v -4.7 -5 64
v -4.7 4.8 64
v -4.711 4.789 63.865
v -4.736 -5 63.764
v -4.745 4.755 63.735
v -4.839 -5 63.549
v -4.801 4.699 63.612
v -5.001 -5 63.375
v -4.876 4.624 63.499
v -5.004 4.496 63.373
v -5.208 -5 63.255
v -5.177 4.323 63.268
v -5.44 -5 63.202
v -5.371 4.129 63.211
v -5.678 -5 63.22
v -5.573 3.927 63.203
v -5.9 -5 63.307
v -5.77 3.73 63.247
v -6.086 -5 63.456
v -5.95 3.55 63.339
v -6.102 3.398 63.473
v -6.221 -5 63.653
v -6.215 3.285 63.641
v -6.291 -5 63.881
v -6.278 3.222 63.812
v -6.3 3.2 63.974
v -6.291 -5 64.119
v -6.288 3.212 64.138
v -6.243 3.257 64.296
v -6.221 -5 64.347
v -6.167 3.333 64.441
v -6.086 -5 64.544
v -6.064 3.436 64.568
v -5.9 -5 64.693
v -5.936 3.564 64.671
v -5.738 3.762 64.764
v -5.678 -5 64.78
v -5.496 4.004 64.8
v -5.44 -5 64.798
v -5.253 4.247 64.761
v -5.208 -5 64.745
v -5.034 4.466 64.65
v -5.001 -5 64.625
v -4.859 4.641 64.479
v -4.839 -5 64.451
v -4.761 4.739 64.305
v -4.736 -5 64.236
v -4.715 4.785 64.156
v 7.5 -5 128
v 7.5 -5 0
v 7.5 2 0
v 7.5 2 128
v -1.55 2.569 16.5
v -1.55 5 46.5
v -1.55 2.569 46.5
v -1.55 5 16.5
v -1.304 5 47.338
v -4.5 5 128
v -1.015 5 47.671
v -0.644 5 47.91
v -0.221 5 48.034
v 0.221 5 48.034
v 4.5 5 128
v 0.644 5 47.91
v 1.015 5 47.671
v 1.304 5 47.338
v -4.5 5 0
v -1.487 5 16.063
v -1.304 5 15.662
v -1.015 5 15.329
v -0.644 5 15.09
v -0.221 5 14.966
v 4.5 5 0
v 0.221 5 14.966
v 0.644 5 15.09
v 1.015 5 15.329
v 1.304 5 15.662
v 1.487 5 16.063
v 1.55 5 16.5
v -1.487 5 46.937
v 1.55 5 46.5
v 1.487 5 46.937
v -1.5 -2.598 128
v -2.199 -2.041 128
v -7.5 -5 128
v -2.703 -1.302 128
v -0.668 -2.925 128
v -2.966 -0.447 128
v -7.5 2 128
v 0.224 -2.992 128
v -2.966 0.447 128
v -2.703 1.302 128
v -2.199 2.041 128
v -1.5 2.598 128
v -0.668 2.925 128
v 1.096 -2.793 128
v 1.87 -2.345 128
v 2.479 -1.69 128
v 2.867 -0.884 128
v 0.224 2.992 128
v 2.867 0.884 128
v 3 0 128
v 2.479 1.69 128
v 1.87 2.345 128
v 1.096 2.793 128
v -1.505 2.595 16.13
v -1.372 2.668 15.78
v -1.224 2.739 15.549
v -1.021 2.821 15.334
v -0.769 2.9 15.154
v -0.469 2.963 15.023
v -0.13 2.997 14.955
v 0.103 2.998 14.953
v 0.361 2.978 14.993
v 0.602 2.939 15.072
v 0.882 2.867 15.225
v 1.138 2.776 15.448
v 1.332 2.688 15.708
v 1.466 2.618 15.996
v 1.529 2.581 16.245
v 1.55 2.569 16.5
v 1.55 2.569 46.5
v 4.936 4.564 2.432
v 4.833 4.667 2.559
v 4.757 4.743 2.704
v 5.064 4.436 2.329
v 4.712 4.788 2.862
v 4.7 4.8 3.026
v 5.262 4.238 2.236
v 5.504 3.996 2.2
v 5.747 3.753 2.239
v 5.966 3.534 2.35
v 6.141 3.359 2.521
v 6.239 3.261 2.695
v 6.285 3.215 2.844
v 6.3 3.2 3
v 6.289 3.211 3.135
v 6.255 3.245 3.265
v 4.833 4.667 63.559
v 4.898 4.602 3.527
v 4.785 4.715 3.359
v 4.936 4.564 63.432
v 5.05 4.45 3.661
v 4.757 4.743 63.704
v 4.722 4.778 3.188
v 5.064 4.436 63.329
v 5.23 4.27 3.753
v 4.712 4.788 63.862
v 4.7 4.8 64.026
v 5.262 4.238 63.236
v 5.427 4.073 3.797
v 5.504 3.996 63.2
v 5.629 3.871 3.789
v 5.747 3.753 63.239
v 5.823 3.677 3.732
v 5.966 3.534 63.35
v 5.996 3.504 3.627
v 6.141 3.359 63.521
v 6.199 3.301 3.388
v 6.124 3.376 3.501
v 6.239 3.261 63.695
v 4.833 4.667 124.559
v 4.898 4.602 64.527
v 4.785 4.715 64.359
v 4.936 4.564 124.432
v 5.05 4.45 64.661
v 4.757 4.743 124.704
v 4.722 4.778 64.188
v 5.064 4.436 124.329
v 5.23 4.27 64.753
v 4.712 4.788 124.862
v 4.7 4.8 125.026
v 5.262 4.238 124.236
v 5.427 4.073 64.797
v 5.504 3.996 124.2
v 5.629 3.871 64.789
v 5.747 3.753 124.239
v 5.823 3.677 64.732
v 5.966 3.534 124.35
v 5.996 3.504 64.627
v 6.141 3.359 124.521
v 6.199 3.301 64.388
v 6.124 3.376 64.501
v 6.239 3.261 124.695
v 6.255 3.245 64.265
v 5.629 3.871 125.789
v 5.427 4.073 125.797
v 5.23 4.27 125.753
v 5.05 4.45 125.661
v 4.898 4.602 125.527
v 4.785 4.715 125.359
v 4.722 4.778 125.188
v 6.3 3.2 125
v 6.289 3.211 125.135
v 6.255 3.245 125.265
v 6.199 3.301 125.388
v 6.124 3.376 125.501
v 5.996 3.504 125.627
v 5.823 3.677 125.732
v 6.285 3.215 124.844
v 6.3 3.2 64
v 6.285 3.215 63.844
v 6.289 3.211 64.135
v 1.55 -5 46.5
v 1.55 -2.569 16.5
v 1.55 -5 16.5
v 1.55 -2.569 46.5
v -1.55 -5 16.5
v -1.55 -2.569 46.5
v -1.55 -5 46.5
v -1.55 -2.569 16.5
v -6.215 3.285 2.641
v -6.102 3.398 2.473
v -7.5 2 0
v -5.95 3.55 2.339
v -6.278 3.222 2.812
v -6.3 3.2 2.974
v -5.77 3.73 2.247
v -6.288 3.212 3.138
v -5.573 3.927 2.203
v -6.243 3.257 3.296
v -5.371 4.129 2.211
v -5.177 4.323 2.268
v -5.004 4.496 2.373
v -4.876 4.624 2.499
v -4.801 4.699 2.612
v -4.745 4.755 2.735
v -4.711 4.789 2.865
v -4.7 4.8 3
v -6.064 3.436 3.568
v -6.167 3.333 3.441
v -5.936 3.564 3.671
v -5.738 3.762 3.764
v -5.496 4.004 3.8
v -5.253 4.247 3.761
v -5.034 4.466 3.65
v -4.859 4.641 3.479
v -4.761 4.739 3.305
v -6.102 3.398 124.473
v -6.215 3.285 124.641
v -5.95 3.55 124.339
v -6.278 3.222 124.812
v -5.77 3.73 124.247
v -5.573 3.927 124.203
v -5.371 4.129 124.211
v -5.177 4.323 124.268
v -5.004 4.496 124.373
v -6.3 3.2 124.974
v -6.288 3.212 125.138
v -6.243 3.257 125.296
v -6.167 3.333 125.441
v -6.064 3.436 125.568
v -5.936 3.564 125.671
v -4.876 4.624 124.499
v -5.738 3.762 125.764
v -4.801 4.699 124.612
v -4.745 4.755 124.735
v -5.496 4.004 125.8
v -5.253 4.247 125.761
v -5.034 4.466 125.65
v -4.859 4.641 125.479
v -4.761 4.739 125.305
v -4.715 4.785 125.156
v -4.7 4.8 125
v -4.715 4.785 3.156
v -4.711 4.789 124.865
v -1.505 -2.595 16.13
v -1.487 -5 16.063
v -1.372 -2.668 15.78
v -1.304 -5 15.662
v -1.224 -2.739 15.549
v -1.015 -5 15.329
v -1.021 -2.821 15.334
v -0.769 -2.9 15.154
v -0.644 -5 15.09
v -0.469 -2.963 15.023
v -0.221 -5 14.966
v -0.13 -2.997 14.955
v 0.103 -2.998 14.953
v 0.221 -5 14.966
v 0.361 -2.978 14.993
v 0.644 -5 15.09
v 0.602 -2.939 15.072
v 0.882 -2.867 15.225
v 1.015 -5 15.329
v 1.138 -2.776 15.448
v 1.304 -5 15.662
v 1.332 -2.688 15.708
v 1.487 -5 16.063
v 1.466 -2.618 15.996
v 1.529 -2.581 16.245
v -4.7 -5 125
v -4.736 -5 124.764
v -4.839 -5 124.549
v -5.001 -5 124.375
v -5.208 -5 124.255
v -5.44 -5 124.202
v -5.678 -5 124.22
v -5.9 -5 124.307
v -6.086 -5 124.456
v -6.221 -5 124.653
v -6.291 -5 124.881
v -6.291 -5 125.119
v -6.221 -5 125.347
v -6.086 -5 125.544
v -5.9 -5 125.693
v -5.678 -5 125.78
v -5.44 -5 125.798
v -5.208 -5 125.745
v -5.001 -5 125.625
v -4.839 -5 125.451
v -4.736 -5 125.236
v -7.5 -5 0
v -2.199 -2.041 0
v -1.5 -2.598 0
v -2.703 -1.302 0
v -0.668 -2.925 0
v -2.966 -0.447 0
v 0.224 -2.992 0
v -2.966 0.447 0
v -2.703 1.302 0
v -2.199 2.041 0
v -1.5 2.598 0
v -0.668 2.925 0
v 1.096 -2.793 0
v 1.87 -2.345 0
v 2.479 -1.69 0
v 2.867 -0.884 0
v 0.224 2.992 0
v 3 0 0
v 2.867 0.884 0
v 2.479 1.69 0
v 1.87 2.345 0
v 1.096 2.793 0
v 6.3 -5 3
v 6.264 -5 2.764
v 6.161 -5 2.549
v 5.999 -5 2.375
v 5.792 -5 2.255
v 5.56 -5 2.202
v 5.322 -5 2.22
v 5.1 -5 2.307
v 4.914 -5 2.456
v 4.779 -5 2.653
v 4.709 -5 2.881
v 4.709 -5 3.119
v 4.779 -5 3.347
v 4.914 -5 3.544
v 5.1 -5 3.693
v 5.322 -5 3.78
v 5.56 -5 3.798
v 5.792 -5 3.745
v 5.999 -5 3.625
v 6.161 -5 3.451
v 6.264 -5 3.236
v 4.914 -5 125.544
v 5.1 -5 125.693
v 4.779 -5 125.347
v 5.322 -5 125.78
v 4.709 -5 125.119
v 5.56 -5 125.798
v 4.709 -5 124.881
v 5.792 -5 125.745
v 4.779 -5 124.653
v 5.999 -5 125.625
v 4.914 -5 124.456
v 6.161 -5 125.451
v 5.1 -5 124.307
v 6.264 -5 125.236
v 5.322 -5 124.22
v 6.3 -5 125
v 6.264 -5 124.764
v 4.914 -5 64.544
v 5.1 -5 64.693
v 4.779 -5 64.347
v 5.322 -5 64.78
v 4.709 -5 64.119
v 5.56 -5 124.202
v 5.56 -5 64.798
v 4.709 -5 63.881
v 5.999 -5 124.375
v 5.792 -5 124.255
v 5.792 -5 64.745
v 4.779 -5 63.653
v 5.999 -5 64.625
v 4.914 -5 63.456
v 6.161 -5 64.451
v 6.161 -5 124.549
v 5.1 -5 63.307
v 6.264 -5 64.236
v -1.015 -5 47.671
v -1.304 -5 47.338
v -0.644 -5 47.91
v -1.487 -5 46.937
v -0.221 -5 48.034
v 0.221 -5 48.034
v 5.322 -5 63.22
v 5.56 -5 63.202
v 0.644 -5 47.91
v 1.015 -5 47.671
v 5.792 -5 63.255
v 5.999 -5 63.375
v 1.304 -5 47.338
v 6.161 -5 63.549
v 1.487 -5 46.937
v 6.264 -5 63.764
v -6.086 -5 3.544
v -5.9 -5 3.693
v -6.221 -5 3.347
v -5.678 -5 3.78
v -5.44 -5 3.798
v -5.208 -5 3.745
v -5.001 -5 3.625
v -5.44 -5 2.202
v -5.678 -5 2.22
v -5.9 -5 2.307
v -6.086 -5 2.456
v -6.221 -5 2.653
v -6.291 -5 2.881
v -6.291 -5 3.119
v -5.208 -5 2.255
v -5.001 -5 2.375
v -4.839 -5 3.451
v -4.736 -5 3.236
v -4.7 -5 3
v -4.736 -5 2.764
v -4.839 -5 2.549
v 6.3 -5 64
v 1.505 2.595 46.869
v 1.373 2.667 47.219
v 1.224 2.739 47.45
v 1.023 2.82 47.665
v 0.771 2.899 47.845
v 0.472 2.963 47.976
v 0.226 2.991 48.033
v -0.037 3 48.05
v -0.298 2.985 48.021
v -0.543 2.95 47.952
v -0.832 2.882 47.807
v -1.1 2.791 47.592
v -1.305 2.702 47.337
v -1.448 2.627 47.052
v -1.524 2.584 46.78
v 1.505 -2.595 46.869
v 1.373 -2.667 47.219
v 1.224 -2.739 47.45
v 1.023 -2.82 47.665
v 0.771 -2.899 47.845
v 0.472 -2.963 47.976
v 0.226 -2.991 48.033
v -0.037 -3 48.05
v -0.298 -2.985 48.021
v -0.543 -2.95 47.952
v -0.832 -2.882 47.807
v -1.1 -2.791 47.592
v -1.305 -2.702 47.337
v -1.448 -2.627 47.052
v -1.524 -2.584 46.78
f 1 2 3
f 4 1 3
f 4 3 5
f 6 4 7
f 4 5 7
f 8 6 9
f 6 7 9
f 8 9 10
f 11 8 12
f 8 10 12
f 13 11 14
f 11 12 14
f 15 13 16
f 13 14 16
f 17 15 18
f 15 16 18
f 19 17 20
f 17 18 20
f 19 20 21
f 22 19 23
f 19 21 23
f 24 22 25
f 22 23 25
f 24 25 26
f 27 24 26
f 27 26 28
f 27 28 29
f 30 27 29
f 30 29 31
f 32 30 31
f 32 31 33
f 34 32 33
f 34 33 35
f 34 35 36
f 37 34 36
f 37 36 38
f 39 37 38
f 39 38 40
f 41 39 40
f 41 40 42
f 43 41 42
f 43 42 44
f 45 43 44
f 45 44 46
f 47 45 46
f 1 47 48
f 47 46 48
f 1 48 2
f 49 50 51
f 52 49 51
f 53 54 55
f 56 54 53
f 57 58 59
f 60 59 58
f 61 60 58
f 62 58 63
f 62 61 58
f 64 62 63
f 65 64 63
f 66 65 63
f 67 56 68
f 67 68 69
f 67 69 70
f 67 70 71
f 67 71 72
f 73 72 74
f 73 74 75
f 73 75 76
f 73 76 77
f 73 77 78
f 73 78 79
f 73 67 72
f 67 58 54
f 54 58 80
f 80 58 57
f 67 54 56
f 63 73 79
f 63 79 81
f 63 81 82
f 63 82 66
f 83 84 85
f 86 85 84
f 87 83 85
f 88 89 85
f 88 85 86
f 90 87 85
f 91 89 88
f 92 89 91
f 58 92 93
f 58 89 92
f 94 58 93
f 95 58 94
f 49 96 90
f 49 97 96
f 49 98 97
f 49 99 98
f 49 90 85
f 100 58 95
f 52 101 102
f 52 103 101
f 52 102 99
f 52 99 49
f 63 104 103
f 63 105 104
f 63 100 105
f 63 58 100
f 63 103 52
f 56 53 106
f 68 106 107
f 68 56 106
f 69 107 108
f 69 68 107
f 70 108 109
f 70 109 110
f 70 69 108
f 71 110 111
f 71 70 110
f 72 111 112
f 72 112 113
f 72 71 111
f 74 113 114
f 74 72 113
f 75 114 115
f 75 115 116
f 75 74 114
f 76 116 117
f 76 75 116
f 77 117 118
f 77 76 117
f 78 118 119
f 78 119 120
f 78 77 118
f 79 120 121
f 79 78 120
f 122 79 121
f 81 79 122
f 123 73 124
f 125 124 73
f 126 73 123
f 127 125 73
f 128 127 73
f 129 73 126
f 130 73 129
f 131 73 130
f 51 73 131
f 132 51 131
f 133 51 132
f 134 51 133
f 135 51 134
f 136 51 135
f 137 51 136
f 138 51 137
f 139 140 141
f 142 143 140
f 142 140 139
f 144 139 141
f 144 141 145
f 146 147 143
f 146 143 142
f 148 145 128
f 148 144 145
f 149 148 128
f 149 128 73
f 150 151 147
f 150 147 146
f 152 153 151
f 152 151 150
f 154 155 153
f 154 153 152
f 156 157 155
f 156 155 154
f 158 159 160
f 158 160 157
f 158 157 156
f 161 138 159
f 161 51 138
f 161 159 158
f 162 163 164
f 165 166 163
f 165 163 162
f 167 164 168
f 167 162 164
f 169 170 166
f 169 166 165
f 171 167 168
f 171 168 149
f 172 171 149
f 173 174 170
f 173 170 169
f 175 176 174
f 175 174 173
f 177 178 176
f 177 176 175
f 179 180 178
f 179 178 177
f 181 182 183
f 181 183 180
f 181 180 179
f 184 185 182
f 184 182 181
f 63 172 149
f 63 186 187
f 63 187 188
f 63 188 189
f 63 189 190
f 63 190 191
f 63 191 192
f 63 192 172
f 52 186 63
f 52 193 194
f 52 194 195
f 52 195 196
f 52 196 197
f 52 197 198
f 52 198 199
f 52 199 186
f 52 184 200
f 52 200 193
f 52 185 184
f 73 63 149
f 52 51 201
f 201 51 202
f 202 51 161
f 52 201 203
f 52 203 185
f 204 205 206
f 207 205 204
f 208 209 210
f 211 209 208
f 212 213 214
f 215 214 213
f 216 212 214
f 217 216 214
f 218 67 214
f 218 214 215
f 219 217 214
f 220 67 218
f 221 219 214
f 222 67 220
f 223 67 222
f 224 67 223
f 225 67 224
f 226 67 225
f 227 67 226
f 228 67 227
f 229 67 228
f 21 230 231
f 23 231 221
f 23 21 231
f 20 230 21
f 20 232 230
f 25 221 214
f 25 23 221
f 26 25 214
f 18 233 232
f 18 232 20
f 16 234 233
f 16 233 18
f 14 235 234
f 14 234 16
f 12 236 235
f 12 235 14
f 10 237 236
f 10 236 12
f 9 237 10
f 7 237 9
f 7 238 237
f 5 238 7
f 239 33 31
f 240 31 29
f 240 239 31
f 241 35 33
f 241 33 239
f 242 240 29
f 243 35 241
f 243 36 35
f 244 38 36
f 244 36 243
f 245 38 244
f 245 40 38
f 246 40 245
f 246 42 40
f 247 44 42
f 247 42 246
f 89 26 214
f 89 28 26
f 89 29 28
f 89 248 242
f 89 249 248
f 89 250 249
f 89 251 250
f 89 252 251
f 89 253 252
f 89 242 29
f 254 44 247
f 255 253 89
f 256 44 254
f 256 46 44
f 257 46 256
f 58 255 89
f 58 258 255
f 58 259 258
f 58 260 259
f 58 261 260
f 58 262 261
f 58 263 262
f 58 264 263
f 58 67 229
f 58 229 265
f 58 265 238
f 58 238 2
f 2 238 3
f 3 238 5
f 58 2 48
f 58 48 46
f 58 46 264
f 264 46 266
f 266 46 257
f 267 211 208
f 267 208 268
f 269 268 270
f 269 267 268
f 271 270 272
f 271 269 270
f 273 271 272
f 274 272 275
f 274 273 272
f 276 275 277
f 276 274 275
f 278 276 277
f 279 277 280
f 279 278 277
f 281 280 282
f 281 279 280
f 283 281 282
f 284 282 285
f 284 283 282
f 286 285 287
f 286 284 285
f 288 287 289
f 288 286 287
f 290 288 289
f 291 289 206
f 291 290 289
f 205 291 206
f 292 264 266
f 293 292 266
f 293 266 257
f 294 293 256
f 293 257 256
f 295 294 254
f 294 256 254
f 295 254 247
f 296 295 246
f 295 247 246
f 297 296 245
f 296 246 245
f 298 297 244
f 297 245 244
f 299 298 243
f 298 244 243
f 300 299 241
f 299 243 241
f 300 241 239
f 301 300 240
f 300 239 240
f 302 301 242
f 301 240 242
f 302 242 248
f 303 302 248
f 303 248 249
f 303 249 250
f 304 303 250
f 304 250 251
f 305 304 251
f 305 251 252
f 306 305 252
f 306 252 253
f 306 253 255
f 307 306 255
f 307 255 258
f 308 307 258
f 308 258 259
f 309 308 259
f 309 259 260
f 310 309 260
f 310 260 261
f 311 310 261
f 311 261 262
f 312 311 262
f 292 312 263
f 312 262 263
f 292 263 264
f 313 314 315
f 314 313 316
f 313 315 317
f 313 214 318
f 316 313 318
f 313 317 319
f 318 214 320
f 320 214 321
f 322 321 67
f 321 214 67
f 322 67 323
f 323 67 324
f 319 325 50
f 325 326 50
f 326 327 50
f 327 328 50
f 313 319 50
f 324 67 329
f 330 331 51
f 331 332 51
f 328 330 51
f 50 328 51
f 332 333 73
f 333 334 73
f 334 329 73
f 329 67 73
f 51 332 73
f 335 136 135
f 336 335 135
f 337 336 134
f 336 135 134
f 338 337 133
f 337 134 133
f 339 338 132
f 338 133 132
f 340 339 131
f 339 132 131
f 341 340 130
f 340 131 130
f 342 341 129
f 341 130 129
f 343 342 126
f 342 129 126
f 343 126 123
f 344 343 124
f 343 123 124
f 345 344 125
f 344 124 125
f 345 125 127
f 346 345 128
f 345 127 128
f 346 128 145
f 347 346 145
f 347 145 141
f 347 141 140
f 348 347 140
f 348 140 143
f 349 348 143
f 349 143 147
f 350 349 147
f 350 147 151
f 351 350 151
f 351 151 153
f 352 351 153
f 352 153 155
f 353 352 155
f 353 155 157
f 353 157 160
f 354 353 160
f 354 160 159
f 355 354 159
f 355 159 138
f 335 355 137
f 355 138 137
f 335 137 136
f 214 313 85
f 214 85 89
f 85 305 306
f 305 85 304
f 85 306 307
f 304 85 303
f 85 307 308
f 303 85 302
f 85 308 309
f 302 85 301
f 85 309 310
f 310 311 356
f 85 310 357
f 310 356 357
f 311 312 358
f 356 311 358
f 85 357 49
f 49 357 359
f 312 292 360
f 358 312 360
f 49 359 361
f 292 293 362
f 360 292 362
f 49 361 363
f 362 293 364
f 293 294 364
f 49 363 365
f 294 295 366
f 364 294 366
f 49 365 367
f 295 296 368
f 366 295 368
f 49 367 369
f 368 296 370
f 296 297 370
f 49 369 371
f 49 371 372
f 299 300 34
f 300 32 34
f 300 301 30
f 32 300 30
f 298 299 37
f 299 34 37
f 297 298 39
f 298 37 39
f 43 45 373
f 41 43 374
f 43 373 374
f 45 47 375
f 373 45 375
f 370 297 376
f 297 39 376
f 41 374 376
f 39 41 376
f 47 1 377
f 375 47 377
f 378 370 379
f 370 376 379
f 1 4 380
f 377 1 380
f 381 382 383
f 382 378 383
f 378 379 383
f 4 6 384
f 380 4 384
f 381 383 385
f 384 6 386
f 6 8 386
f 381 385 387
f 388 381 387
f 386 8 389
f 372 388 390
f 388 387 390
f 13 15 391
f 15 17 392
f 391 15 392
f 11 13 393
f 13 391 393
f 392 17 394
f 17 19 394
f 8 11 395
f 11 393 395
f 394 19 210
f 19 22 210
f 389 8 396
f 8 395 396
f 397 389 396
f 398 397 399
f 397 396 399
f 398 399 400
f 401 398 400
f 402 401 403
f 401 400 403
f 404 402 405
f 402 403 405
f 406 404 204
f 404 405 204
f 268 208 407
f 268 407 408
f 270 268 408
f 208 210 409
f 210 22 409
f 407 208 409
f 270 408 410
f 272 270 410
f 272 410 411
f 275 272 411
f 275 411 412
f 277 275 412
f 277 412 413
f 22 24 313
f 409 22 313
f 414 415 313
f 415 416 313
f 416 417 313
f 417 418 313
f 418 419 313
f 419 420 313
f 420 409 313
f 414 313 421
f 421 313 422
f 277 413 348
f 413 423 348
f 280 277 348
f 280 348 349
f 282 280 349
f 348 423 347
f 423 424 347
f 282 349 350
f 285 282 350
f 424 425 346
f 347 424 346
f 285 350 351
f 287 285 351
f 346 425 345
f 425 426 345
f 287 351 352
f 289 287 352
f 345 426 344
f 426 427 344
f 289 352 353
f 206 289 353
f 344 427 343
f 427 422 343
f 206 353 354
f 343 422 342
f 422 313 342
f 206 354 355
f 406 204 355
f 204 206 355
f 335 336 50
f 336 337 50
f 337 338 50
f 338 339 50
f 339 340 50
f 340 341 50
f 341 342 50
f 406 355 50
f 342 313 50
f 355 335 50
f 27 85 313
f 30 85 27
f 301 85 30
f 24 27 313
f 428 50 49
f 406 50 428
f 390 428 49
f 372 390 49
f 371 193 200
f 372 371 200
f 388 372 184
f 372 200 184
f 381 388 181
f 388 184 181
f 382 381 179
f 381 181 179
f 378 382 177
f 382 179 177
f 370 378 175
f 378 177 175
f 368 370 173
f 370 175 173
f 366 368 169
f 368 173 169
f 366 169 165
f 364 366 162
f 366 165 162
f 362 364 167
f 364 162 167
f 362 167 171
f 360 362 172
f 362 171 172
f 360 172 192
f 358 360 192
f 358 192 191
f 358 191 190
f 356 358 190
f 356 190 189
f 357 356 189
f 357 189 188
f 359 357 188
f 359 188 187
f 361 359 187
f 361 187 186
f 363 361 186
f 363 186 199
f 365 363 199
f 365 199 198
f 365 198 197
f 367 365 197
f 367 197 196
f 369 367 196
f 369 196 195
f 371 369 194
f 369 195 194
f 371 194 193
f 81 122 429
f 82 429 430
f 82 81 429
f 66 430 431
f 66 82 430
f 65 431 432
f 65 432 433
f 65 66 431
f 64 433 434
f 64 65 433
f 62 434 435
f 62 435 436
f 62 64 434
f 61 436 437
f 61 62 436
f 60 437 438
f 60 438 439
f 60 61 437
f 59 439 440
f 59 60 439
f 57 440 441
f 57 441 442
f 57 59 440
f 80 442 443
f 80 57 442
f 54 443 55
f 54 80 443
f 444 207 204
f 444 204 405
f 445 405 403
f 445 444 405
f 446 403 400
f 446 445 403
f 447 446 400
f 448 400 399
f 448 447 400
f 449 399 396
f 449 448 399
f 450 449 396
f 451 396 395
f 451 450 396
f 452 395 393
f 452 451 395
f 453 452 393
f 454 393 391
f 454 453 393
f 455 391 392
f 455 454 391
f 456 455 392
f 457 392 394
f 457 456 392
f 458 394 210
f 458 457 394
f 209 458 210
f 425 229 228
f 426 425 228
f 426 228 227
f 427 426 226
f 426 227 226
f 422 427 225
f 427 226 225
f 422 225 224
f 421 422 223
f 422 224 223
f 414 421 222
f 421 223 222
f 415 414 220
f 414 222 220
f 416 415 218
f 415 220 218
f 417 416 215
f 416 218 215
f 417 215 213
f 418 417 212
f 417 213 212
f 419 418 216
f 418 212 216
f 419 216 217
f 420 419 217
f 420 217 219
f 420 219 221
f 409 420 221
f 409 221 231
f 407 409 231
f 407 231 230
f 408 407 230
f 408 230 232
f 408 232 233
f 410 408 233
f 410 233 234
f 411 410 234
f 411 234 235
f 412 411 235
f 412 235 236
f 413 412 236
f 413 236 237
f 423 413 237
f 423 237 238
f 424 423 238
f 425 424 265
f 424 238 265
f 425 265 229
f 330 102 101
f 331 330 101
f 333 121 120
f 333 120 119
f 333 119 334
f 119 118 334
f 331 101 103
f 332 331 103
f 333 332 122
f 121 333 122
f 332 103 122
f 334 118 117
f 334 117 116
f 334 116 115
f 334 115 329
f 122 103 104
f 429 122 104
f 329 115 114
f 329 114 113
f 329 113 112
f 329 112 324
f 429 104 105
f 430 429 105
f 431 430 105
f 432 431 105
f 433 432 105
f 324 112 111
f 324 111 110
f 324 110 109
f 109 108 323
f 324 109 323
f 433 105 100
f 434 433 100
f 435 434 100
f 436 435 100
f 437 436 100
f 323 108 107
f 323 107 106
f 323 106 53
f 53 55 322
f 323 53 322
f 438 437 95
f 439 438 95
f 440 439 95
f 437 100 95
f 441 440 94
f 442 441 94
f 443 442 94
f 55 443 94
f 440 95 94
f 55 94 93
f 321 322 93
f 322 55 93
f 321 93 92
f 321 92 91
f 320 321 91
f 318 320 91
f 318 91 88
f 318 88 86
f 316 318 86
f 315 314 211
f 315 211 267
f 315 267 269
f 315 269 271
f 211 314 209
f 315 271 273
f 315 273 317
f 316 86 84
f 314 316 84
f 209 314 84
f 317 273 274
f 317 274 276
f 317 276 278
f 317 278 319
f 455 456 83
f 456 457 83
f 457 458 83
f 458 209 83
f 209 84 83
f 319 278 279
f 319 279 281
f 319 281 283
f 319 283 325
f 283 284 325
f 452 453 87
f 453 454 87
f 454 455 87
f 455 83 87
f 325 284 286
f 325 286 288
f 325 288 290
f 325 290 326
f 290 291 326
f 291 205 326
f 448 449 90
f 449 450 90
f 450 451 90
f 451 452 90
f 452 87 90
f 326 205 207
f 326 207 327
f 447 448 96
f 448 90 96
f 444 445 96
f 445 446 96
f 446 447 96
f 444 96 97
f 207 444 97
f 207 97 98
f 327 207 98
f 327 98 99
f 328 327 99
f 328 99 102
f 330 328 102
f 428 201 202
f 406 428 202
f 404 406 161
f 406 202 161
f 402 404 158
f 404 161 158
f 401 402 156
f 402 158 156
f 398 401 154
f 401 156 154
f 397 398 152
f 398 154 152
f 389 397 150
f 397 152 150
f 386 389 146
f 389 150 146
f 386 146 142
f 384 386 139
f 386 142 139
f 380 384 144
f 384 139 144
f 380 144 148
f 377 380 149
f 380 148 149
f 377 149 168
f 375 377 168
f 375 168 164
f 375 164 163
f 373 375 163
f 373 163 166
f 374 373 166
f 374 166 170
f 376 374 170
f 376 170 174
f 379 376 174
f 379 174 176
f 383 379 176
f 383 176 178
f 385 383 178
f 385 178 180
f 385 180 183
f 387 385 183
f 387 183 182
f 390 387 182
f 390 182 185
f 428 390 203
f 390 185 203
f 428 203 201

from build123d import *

# Parameters (mm, degrees)
ESQUISSE1_W                               = 15
ESQUISSE1_H                               = 10
BOSS_EXTRU_1_DEPTH                        = 128
ESQUISSE2_R                               = 3
ENL_V_MAT_EXTRU_1_DEPTH                   = 129.316990301
ENL_V_MAT_EXTRU_2_DEPTH                   = 129.608903269
CHANFREIN1_SIZE                           = 3
TROU_POUR_TARAUDAGE_POUR_TROU_TARAUD_M2_D = 1.6
R_P_TITION_LIN_AIRE1_COUNT                = 3
R_P_TITION_LIN_AIRE1_PITCH                = 61
R_P_TITION_LIN_AIRE1_COUNT_DIR2           = 2
R_P_TITION_LIN_AIRE1_PITCH_DIR2           = 11


with BuildPart() as part:
    # Esquisse1 → Boss.-Extru.1 (new body)
    with BuildSketch(Plane.XY):
        Rectangle(ESQUISSE1_W, ESQUISSE1_H)
    extrude(amount=BOSS_EXTRU_1_DEPTH)

    # Esquisse2 → Enlèv. mat.-Extru.1 (cut, through all)
    with BuildSketch(Plane.XY.offset(128)):
        Circle(ESQUISSE2_R)
    extrude(amount=-ENL_V_MAT_EXTRU_1_DEPTH, mode=Mode.SUBTRACT)

    # Esquisse3 → Enlèv. mat.-Extru.2 (cut, through all)
    with BuildSketch(Plane(origin=(0, 5, 0), x_dir=(1, 0, 0), z_dir=(0, 1, 0))):
        with BuildLine():
            Line((1.55, -16.5), (1.55, -46.5))
            ThreePointArc((1.55, -46.5), (0, -48.05), (-1.55, -46.5))
            Line((-1.55, -46.5), (-1.55, -16.5))
            ThreePointArc((-1.55, -16.5), (0, -14.95), (1.55, -16.5))
        make_face()
    extrude(amount=-ENL_V_MAT_EXTRU_2_DEPTH, mode=Mode.SUBTRACT)

    # Chanfrein1
    chanfrein1_edges = [part.edges().sort_by_distance(p)[0] for p in [
        (-7.5, 5, 64),
        (7.5, 5, 64),
    ]]
    chamfer(chanfrein1_edges, length=CHANFREIN1_SIZE)

    # Trou pour taraudage pour trou taraudé M21 (through all)
    with Locations(Plane(origin=(0, -5, 0), x_dir=(-1, 0, 0), z_dir=(0, -1, 0))):
        with Locations((5.5, -125)):
            trou_pour_taraudage_pour_trou_taraud_m2 = Hole(TROU_POUR_TARAUDAGE_POUR_TROU_TARAUD_M2_D / 2)

    # Répétition linéaire1: Trou pour taraudage pour trou taraud_ M2 3 × 2
    with Locations(*[(j * R_P_TITION_LIN_AIRE1_PITCH_DIR2, 0, -i * R_P_TITION_LIN_AIRE1_PITCH) for i in range(R_P_TITION_LIN_AIRE1_COUNT) for j in range(R_P_TITION_LIN_AIRE1_COUNT_DIR2) if (i, j) != (0, 0)]):
        add(trou_pour_taraudage_pour_trou_taraud_m2, mode=Mode.SUBTRACT)


solid = part.part
